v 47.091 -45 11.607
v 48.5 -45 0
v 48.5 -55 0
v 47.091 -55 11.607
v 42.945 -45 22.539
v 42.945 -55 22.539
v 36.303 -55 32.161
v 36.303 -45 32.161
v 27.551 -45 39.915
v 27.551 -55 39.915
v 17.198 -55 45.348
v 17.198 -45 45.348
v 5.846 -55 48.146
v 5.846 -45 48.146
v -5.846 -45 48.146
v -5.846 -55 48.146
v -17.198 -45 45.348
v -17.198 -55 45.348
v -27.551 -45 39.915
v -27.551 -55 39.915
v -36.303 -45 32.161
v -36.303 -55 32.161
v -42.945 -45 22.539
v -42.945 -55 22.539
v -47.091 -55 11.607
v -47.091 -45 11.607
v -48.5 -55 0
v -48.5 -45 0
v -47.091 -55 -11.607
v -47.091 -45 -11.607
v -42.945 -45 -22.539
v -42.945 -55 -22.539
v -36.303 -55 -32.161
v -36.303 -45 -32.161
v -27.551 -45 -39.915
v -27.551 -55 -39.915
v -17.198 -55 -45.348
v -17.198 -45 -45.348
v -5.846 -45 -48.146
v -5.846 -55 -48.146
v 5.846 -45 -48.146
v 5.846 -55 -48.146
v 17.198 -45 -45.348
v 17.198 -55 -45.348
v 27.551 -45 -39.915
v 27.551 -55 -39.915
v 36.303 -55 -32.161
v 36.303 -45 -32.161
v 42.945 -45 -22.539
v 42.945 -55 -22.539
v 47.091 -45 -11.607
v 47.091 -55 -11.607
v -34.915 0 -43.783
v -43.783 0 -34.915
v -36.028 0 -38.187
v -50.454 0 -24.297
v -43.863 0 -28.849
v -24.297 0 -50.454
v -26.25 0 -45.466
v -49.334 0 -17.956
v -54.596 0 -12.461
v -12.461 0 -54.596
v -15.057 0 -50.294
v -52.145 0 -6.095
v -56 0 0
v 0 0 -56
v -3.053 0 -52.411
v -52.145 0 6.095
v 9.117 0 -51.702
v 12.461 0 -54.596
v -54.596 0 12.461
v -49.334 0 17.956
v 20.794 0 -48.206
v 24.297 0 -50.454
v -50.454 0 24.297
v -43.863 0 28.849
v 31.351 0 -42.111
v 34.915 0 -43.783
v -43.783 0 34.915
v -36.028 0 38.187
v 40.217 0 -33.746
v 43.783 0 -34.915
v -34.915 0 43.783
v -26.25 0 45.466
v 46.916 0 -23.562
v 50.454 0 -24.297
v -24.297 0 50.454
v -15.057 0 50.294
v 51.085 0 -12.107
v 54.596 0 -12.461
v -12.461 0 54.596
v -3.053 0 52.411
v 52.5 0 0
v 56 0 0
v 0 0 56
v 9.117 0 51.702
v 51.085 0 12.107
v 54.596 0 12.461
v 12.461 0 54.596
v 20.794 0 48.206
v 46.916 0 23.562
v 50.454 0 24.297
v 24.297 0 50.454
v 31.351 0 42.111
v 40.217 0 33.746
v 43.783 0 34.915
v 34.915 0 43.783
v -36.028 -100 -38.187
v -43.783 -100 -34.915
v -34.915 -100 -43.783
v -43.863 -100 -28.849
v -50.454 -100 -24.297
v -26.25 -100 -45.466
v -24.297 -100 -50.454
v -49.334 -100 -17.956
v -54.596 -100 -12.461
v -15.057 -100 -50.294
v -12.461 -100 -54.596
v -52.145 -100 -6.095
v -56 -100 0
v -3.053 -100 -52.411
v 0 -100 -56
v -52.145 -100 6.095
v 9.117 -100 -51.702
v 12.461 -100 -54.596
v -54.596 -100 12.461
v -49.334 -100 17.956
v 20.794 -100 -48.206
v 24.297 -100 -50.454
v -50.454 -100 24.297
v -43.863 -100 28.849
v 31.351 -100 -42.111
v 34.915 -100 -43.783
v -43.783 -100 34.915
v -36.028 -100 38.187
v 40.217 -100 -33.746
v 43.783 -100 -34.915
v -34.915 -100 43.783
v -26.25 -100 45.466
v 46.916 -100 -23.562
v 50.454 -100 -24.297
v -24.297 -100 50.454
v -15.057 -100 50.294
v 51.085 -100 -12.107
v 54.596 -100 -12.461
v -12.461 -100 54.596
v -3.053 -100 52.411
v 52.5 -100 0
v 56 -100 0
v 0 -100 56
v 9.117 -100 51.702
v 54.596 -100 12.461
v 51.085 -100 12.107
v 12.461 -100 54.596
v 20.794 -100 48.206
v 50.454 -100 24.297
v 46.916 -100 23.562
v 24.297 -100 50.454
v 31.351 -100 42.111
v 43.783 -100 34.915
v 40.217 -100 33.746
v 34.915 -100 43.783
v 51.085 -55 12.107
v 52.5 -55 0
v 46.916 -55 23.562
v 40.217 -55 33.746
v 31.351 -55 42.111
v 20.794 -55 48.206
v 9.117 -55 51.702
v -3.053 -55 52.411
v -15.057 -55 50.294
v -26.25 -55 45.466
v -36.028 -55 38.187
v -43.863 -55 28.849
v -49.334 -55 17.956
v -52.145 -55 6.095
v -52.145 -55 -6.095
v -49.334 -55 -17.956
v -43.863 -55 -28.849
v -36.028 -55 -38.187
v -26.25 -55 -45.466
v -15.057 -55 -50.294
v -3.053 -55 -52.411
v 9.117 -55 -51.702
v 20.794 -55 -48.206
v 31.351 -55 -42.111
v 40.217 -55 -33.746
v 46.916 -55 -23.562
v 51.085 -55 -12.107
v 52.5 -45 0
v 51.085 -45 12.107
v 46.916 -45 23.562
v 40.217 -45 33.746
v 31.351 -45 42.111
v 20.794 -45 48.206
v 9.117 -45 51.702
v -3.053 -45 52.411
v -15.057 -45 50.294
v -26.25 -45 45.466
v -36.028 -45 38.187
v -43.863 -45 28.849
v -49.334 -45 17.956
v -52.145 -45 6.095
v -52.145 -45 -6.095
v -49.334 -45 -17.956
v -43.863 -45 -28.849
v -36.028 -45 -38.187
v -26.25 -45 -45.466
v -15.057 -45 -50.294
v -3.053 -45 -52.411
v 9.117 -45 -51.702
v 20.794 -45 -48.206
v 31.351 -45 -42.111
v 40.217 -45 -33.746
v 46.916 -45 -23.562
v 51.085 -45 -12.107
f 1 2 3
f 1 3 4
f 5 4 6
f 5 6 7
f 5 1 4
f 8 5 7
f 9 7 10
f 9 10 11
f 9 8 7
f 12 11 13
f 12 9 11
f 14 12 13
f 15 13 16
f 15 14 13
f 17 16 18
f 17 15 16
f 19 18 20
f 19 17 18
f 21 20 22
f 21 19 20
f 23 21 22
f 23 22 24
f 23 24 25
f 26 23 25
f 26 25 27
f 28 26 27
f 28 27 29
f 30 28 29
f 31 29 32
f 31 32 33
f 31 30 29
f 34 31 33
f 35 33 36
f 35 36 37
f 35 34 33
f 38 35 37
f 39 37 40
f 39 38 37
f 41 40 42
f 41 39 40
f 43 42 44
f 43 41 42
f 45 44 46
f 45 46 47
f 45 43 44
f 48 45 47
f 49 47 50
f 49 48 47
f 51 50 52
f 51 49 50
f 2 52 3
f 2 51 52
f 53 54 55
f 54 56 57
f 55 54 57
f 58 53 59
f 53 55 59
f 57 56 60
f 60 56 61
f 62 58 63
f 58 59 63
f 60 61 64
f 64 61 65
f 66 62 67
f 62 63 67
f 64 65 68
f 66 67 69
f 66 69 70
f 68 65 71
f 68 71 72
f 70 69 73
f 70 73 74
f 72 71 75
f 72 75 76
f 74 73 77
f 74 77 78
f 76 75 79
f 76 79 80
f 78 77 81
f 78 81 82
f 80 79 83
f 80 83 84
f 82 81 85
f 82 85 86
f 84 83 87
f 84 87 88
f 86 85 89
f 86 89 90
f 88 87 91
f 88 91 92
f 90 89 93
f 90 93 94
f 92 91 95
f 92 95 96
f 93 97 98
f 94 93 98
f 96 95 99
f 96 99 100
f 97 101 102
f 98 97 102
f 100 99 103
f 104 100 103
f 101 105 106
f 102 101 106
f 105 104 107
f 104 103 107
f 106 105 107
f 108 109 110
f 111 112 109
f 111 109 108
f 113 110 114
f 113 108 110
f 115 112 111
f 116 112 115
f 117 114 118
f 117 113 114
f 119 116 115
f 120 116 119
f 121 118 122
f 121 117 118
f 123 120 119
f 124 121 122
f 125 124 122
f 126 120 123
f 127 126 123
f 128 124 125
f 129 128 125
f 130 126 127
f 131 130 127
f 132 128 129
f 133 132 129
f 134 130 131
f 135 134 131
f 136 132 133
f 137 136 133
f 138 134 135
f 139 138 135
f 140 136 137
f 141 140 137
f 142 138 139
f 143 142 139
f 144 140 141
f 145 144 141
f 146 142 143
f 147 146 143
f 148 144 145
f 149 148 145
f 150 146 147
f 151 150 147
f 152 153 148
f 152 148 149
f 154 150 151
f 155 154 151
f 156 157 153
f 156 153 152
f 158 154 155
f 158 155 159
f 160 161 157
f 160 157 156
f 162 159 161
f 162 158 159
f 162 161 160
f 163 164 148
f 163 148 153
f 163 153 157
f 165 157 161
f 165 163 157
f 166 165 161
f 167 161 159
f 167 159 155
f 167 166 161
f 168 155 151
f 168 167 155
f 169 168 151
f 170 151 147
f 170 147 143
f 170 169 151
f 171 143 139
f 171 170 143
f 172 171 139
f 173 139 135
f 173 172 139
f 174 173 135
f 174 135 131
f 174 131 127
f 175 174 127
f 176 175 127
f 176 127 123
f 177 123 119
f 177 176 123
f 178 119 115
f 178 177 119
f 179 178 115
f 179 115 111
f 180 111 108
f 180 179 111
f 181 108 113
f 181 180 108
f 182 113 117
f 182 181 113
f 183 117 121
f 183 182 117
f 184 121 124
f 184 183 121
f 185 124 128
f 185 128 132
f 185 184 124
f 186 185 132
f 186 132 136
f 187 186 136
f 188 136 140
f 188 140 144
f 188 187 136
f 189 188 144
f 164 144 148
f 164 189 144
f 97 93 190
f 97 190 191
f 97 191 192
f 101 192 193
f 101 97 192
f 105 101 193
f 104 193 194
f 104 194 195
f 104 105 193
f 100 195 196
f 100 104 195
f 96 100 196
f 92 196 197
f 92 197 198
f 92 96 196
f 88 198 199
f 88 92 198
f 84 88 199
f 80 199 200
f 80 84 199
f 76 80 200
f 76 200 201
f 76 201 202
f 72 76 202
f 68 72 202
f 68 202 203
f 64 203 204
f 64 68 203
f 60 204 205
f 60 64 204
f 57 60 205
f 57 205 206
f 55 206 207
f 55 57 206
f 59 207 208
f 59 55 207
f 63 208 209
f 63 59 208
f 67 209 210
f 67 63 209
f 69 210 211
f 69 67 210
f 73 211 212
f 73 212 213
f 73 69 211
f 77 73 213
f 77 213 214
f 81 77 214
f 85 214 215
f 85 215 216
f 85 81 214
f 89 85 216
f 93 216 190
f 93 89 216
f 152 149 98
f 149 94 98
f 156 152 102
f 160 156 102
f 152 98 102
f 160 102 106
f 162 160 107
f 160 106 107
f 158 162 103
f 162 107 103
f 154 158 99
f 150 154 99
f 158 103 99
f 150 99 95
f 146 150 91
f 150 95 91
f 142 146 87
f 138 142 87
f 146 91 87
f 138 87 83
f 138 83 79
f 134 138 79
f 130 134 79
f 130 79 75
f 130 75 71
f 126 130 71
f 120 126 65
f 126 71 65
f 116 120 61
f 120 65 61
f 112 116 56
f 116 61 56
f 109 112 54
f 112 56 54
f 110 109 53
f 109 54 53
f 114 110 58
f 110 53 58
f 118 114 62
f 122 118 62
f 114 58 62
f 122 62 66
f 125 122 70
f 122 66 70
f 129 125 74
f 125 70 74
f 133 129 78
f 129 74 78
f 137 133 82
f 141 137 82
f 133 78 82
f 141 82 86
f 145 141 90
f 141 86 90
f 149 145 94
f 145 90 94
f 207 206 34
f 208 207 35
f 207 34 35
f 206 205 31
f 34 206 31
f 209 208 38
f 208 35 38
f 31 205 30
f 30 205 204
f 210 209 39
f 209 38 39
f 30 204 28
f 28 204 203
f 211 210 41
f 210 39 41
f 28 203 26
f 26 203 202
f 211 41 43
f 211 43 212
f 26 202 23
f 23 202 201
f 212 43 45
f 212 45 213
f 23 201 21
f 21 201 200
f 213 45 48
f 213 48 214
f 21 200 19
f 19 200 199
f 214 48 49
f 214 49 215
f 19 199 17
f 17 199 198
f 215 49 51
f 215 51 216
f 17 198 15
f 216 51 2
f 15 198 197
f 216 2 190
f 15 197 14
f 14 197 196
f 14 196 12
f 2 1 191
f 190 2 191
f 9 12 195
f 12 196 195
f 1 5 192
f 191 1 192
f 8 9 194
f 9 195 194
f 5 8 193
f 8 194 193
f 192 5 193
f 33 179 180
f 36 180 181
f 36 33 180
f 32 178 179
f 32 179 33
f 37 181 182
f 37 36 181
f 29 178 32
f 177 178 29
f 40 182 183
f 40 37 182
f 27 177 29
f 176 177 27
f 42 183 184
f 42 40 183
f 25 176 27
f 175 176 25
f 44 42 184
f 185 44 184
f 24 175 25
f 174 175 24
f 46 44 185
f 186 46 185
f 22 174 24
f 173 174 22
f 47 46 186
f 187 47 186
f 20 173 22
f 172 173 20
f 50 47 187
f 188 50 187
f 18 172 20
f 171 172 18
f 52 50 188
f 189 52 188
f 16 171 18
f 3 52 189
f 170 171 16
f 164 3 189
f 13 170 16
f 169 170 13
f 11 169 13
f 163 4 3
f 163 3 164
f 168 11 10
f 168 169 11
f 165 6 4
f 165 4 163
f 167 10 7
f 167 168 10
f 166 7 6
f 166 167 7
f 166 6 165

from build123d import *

# Parameters (mm, degrees)
F0_R     = 56
F0_R_2   = 52.5
F1_DEPTH = 45
F2_R     = 56
F2_R_2   = 52.5
F2_R_3   = 48.5
F3_DEPTH = 10
F4_R     = 56
F4_R_2   = 52.5
F5_DEPTH = 45


with BuildPart() as f1:
    # F0 (on Front) → F1 (new body)
    with BuildSketch(Plane.XZ):
        Circle(F0_R)
        Circle(F0_R_2, mode=Mode.SUBTRACT)
    extrude(amount=F1_DEPTH)

    # F2 (on face) → F3 (join)
    with BuildSketch(Plane.XZ.offset(45)):
        Circle(F2_R)
        Circle(F2_R_2, mode=Mode.SUBTRACT)
        Circle(F2_R_2)
        Circle(F2_R_3, mode=Mode.SUBTRACT)
    extrude(amount=F3_DEPTH)

    # F4 (on face) → F5 (join)
    with BuildSketch(Plane.XZ.offset(55)):
        Circle(F4_R)
        Circle(F4_R_2, mode=Mode.SUBTRACT)
    extrude(amount=F5_DEPTH)


solid = f1.part
